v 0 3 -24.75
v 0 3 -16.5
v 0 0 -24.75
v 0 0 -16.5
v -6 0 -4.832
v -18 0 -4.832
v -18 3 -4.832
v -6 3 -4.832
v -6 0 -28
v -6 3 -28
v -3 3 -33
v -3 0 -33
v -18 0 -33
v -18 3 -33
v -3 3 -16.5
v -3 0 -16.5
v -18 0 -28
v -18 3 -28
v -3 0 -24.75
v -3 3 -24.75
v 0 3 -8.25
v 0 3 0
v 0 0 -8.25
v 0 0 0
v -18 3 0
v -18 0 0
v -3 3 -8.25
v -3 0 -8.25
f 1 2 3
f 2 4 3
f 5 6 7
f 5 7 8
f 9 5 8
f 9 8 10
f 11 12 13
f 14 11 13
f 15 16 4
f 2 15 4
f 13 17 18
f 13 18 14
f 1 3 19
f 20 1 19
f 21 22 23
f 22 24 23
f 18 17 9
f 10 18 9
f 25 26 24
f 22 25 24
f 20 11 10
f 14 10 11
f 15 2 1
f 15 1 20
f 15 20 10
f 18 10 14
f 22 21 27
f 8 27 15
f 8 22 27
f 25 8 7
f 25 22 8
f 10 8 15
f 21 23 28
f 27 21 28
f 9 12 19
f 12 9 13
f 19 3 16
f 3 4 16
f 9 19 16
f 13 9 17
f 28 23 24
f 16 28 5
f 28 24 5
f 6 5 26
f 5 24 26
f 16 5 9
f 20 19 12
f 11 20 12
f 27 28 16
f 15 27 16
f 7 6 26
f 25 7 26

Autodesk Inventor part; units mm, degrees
ref_plane "YZ Plane" through (0, 0, 0) normal (1, 0, 0) x (0, 1, 0)
ref_plane "XZ Plane" through (0, 0, 0) normal (0, 1, 0) x (-1, 0, 0)
ref_plane "XY Plane" through (0, 0, 0) normal (0, 0, 1) x (1, 0, 0)
sketch "Boceto1" plane through (0, 0, 0) normal (0, 1, 0) x (-1, 0, 0)
  line L0 (0, 0) -> (0, -8.25)
  line L1 (0, -8.25) -> (3, -8.25)
  line L2 (3, -8.25) -> (3, -16.5)
  line L3 (3, -16.5) -> (0, -16.5)
  line L4 (0, -16.5) -> (0, -24.75)
  line L5 (0, -24.75) -> (3, -24.75)
  line L6 (3, -24.75) -> (3, -33)
  line L7 (3, -33) -> (20, -33)
  line L8 (20, 0) -> (0, 0)
  line L9 (20, -28) -> (8, -28)
  line L10 (8, -28) -> (8, -5)
  line L11 (8, -5) -> (20, -5)
  line L12 (20, -33) -> (20, -28)
  line L13 (20, -5) -> (20, 0)
  dimension "d0" = 8.25
  dimension "d1" = 3
  dimension "d3" = 8.25
extrude "Extrusión1" add sketch "Boceto1" along normal blind 3
sketch "Boceto2" plane through (0, 0, 0) normal (0, -1, 0) x (1, 0, 0)
  line L0 (-8, -28) -> (-8, -5) projected
  line L1 (-8, -5) -> (-8, -28)
  line L2 (-8, -28) -> (-6, -28)
  line L3 (-6, -28) -> (-6, -5)
  line L4 (-6, -5) -> (-8, -5)
  line L5 (-20, 0) -> (-20, -5)
  line L6 (-20, -5) -> (-18, -5)
  line L7 (-18, -5) -> (-18, 0)
  line L8 (-18, 0) -> (-20, 0)
  line L9 (-20, -33) -> (-20, -28)
  line L10 (-20, -28) -> (-18, -28)
  line L11 (-18, -28) -> (-18, -33)
  line L12 (-18, -33) -> (-20, -33)
extrude "Extrusión2" cut sketch "Boceto2" against normal blind 10
sketch "Boceto5" plane through (0, 0, 0) normal (0, -1, 0) x (1, 0, 0)
  line L0 (-18, -5) -> (-6, -5) projected
  line L1 (-18, -5) -> (-18, -4.832)
  line L2 (-18, -5) -> (-18, 0) projected
  line L3 (-18, -4.832) -> (-6, -4.832)
  line L4 (-6, -5) -> (-6, -28) projected
  line L5 (-6, -4.832) -> (-6, -5)
  line L6 (-6, -5) -> (-18, -5)
  point P0 (0, 0)
  dimension "d22" = 0.168
extrude "Extrusión4" cut sketch "Boceto5" against normal blind 3
properties part number "muñeca7"
